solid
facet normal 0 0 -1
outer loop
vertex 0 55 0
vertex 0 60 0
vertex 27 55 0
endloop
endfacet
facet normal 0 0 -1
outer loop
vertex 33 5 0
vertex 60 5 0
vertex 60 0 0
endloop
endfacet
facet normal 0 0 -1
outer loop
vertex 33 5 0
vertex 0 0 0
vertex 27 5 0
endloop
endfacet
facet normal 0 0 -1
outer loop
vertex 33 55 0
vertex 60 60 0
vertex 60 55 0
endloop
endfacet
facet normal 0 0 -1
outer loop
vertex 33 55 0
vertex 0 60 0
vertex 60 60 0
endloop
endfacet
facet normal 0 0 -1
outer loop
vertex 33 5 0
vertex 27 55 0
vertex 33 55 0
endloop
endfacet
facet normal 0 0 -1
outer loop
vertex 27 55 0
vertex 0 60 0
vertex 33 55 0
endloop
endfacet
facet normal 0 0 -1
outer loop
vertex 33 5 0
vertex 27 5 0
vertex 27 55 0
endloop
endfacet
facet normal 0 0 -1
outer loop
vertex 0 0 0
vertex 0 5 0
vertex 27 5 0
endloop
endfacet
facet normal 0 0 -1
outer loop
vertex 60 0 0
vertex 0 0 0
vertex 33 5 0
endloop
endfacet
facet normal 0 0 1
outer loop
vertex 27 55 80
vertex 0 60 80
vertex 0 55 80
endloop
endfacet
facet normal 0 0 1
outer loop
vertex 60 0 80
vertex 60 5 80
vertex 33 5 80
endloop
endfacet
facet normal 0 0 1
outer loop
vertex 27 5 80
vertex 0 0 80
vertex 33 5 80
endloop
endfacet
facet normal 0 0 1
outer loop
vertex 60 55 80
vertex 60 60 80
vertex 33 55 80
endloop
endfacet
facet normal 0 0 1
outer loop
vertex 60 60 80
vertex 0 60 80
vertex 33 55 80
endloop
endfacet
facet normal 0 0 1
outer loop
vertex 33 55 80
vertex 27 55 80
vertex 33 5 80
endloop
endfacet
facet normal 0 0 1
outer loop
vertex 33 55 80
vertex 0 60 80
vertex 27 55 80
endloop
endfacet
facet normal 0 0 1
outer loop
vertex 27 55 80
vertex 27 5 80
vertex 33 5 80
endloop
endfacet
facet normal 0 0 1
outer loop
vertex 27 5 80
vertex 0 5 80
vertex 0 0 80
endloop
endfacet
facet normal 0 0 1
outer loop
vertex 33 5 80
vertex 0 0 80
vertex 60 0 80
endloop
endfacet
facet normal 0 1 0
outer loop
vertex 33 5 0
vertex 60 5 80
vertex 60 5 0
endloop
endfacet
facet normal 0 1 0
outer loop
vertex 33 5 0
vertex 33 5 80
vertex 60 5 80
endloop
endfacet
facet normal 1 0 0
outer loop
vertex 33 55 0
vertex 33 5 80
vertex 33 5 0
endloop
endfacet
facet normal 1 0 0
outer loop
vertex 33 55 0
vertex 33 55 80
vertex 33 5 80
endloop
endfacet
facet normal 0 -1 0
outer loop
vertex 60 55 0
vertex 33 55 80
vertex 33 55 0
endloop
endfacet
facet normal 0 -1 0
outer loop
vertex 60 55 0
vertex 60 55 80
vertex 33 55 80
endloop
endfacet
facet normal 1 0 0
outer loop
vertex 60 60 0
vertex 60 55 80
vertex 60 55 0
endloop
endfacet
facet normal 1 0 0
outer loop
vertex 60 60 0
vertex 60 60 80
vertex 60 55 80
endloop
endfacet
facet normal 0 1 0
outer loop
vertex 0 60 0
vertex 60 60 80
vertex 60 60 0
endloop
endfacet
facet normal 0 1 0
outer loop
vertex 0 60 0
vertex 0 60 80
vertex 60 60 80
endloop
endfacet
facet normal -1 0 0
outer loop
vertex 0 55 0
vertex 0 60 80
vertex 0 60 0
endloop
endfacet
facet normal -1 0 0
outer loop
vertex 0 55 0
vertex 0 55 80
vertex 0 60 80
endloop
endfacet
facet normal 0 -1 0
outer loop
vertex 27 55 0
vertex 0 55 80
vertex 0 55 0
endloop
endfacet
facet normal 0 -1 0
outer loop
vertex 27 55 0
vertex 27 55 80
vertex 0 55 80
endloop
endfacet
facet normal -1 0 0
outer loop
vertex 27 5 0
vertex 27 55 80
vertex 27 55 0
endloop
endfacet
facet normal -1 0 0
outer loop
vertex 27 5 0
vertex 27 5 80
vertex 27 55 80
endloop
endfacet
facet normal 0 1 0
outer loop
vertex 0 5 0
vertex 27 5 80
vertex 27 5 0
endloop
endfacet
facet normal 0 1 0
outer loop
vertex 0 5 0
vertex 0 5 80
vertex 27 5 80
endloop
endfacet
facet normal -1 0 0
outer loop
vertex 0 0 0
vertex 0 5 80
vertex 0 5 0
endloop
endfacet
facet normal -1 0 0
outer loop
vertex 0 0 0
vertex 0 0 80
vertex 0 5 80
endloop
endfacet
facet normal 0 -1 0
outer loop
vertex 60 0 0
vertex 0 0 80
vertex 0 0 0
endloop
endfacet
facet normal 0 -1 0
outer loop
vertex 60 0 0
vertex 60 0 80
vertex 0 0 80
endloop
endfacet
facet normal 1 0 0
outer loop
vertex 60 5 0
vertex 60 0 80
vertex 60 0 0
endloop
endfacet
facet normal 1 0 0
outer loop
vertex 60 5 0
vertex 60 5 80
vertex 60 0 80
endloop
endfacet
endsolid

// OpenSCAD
$fn = 32;

// ----------------------------------------------------------------------
// Structural section: ibeam 60 x 60 mm
// ----------------------------------------------------------------------

// --- parameters (mm) ---
sec_w = 60;               // section width, X
sec_h = 60;               // section height, Y
flange_t = 5;             // flange thickness
web_t = 6;                // web thickness
plate_t = 80;             // cut length, Z (extrusion height)

profile = [[0, 0], [60, 0], [60, 5], [33, 5], [33, 55], [60, 55], [60, 60], [0, 60], [0, 55], [27, 55], [27, 5], [0, 5]];  // primary outline, 12 points, counter clockwise

// --- the one profile operation ---
linear_extrude(height = plate_t) polygon(points = profile);
